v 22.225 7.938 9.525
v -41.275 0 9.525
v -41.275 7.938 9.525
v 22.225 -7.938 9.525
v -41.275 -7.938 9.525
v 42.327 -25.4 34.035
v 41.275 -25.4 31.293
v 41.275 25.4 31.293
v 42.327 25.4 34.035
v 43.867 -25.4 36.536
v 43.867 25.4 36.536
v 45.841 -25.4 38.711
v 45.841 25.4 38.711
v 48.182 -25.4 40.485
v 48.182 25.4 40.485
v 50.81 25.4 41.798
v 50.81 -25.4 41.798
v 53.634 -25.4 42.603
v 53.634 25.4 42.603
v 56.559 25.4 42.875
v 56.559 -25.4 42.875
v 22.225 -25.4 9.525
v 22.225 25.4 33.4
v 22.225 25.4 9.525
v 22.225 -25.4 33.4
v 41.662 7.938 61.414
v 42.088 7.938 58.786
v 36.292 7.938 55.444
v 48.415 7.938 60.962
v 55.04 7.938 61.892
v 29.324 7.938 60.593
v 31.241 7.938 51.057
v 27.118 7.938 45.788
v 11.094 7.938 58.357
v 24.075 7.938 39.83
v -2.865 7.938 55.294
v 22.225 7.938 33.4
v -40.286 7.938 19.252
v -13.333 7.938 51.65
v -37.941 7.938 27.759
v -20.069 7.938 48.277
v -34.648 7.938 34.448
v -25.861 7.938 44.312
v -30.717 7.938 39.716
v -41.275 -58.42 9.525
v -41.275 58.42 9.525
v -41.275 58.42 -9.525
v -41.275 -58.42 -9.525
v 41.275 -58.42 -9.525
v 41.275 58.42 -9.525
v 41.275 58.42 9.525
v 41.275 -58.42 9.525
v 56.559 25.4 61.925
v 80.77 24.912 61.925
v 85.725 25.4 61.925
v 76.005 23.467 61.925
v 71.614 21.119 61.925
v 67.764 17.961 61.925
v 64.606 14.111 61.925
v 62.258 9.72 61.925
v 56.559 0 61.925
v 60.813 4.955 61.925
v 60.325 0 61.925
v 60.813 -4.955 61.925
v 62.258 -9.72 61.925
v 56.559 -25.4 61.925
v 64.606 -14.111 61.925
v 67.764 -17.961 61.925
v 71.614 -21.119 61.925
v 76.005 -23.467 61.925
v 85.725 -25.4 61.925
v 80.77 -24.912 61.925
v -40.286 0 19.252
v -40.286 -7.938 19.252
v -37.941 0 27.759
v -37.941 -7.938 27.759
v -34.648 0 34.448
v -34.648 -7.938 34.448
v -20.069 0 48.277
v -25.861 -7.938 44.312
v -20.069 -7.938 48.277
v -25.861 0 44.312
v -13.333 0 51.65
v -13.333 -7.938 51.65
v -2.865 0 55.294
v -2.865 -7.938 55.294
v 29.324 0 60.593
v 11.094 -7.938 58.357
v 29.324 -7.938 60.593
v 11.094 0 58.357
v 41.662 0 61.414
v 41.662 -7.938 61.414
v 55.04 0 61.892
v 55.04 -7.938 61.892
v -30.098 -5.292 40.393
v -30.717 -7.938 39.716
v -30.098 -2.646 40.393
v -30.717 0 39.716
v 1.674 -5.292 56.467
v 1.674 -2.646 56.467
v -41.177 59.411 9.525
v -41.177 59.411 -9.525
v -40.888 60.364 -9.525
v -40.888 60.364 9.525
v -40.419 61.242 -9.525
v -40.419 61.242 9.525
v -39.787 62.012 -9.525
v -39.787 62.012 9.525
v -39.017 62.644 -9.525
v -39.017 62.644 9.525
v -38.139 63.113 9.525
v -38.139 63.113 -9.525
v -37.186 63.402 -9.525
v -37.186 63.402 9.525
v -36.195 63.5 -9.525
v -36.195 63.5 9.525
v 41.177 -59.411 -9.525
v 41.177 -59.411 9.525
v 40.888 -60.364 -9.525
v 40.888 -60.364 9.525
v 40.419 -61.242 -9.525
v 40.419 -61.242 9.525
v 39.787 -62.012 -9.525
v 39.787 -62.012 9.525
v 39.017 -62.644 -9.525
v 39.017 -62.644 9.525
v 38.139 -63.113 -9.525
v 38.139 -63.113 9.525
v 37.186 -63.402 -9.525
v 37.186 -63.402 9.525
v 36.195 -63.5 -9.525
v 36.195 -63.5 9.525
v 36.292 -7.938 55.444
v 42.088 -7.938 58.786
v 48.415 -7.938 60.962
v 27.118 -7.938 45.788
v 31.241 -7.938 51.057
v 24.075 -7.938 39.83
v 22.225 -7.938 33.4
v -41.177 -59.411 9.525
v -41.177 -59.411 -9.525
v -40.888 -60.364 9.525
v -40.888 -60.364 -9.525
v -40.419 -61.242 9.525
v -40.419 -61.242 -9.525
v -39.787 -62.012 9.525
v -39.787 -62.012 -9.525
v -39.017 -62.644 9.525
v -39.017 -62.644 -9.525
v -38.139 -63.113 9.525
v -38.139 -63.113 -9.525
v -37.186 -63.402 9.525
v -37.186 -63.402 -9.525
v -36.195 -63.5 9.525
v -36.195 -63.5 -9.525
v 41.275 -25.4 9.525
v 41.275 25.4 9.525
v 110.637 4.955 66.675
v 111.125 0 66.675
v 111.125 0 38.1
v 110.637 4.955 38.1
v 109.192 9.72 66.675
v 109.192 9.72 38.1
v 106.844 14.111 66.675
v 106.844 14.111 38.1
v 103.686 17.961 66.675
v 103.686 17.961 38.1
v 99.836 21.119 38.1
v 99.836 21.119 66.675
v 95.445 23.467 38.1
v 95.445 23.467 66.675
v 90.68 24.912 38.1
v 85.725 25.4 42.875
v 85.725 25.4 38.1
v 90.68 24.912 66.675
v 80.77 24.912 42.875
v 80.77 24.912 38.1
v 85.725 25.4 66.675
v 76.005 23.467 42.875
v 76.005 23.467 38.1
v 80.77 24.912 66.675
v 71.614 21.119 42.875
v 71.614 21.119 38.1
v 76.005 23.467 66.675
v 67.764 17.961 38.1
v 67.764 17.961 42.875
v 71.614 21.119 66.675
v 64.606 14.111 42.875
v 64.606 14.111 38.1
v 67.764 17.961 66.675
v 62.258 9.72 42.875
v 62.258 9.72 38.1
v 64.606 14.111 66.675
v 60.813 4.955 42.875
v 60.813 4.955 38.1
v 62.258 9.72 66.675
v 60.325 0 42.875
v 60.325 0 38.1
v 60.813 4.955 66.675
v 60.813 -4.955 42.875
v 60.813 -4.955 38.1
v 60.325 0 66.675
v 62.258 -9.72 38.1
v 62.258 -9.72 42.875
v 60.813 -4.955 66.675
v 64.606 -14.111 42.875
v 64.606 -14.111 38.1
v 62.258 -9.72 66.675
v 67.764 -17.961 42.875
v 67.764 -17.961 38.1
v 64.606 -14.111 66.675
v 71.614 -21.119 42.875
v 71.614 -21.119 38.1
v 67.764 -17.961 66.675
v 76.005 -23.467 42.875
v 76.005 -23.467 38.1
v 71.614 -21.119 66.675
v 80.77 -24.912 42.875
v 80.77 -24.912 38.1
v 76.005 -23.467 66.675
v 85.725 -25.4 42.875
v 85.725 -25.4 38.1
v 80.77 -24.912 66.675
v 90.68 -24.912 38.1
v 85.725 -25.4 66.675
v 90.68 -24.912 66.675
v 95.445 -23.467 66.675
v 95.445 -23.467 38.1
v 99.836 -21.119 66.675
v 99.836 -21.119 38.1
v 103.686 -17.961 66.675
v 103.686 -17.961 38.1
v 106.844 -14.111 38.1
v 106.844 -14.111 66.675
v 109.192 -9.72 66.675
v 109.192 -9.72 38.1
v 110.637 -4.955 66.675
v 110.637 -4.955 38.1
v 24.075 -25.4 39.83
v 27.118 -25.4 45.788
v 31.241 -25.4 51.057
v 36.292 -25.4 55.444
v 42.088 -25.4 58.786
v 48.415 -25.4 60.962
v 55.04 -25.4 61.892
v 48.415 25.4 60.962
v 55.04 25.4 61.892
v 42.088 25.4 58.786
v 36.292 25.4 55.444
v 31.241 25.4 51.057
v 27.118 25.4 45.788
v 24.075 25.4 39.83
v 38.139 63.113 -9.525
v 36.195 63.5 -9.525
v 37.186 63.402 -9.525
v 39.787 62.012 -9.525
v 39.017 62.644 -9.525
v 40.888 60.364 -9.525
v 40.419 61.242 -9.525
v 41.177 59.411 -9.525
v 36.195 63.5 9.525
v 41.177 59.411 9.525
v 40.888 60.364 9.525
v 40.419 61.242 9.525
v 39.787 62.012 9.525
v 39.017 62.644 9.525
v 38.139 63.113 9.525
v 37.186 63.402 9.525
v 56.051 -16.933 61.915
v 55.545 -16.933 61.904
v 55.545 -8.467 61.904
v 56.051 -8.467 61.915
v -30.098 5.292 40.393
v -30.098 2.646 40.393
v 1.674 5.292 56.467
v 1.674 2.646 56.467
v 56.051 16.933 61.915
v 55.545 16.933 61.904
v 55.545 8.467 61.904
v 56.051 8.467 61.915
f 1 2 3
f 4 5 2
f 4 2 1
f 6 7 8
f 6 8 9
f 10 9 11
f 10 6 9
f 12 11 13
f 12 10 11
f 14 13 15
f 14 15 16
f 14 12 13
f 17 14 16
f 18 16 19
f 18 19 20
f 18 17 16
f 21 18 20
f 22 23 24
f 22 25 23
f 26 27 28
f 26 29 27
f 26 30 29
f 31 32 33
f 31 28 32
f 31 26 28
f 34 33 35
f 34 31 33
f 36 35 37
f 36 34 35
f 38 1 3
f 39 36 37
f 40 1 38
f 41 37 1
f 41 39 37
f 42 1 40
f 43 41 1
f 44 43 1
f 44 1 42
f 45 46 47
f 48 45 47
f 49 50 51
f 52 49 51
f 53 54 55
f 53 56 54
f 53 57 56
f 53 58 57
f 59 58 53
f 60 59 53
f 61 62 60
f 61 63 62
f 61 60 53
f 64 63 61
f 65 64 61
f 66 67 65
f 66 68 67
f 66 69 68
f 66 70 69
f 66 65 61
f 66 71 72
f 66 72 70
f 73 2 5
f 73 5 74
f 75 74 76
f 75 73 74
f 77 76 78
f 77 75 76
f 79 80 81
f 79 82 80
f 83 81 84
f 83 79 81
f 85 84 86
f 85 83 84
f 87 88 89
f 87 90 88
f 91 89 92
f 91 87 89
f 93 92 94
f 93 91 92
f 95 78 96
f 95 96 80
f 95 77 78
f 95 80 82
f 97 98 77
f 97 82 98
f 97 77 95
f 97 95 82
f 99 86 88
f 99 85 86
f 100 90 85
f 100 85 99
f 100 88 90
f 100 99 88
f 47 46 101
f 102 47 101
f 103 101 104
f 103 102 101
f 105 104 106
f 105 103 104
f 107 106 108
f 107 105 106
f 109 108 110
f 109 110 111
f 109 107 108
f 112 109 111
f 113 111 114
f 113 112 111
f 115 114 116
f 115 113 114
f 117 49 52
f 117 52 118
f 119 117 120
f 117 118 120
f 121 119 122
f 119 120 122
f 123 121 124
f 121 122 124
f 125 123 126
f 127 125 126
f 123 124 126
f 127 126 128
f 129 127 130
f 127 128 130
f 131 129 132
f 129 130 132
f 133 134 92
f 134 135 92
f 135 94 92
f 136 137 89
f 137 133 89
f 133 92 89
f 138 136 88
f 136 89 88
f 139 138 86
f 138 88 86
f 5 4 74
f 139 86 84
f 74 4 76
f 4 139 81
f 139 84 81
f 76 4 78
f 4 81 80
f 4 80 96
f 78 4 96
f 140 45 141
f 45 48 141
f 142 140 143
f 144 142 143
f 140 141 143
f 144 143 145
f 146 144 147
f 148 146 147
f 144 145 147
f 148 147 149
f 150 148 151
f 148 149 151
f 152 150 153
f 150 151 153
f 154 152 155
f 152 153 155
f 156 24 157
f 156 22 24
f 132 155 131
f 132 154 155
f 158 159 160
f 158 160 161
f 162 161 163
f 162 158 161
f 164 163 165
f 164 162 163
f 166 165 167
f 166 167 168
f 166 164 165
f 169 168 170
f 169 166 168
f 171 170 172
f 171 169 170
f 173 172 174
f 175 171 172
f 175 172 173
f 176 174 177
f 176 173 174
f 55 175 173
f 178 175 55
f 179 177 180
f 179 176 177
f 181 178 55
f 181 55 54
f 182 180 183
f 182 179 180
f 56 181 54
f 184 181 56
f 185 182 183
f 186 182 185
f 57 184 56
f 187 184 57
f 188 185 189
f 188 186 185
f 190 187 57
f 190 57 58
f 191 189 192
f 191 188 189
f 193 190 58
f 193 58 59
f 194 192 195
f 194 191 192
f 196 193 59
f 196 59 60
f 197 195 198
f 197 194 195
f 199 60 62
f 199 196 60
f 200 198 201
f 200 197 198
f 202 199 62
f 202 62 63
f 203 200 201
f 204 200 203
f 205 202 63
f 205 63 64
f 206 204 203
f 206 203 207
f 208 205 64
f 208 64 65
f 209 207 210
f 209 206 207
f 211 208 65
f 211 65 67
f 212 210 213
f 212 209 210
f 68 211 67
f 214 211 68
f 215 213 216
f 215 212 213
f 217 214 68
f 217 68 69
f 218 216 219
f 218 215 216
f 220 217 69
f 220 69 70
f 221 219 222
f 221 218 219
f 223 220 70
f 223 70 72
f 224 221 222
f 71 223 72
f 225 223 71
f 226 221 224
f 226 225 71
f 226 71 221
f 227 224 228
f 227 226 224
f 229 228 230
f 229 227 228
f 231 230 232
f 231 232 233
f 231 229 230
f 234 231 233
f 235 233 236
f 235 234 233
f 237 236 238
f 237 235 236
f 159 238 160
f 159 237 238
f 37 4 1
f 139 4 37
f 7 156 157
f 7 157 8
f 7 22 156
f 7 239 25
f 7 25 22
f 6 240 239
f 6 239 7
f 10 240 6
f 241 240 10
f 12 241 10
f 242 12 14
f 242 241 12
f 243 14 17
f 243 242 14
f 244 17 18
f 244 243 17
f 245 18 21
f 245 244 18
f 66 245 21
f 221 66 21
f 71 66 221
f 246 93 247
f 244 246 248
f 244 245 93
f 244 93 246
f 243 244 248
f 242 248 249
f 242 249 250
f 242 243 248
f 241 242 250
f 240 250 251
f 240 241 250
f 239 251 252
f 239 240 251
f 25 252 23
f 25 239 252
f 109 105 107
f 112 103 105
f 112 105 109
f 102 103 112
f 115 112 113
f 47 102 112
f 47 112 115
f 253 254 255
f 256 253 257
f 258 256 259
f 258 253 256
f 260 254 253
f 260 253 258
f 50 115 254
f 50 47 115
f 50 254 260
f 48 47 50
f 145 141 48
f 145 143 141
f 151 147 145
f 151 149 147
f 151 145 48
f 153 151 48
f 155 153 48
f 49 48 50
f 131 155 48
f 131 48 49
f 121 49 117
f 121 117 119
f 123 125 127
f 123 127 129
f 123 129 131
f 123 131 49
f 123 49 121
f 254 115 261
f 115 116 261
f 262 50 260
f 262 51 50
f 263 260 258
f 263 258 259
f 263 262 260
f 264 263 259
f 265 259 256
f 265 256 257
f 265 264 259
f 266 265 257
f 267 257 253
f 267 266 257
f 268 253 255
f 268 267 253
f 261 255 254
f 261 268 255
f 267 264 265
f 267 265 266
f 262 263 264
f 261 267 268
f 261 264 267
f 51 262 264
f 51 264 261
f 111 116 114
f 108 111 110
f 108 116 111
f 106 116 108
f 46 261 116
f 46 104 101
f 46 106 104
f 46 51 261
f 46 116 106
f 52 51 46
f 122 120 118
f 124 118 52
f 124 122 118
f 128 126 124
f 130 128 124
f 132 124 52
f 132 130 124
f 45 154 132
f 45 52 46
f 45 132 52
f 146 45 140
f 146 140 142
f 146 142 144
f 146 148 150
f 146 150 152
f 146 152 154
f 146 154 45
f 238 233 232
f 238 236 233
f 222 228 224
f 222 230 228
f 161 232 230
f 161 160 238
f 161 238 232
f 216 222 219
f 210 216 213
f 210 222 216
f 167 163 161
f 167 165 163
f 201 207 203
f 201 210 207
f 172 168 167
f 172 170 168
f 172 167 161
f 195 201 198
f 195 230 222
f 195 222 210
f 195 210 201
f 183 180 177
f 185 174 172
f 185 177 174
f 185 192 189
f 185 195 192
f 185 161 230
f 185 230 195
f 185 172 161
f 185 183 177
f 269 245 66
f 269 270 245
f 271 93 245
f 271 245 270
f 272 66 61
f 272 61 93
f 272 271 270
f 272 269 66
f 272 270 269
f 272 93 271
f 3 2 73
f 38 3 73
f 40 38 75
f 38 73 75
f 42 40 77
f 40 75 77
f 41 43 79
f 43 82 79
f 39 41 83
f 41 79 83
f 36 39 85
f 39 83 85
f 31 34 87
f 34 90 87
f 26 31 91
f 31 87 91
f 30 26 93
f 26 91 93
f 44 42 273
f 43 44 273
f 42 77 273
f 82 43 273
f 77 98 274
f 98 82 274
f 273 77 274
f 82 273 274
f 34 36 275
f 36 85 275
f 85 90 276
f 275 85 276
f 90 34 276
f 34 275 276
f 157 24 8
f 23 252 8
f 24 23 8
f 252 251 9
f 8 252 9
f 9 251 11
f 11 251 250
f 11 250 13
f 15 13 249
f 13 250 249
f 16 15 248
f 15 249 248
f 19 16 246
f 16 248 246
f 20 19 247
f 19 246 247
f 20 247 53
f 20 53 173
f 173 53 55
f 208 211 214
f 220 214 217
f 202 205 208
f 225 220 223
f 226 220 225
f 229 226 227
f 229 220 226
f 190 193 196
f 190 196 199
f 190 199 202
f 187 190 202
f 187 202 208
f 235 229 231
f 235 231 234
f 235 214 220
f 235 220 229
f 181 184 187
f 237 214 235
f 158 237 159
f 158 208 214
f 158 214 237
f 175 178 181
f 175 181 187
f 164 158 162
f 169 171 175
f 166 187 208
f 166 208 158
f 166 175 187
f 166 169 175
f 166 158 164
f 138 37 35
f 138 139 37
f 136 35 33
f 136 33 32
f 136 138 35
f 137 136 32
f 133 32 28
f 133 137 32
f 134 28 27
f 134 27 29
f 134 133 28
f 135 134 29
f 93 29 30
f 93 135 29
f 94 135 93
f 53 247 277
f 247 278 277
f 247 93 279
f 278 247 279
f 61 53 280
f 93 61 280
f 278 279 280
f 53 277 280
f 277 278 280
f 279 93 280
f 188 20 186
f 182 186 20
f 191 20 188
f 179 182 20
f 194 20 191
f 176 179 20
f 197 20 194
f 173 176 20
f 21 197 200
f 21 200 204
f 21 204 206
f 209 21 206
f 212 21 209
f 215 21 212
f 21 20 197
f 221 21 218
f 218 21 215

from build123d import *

# Parameters (mm, degrees)
F1_DEPTH = 63.5
F0_W     = 25.4
F0_H     = 19.05
F2_DEPTH = 25.4
F3_DEPTH = 7.9375
F5_R     = 5.08


with BuildPart() as f1:
    # F0 (on Front) → F1 (new body, symmetric)
    with BuildSketch(Plane.XZ):
        Polygon((-41.275, 9.525), (-41.275, -9.525), (41.275, -9.525), (41.275, 9.525), (22.225, 9.525), align=None)
    extrude(amount=F1_DEPTH, both=True)

    # F5
    f5_edges = [f1.edges().sort_by_distance(p)[0] for p in [
        (-41.275, -63.5, 0),
        (41.275, -63.5, 0),
        (41.275, 63.5, 0),
        (-41.275, 63.5, 0),
    ]]
    fillet(f5_edges, radius=F5_R)


with BuildPart() as f2:
    # F0 (on Front) → F2 (new body, symmetric)
    with BuildSketch(Plane.XZ):
        with BuildLine():
            Line((22.225, 9.525), (41.275, 9.525))
            Line((41.275, 9.525), (41.275, 31.2928673412))
            ThreePointArc((41.275, 31.2928673412), (46.9703447865, 39.6525064902), (56.5586066456, 42.8752))
            Line((56.5586066456, 42.8752), (60.325, 42.8752))
            Line((60.325, 42.8752), (60.325, 61.9252))
            Line((60.325, 61.9252), (56.5586066456, 61.9252))
            add(Edge.make_bspline(
                [(55.0403231536, 61.8921824636), (55.5443471878, 61.9037807853), (56.0504409694, 61.9147836618), (56.5586066456, 61.9252)],
                knots=[110.1222919293, 110.1222919293, 110.1222919293, 110.1222919293, 110.9828615117, 110.9828615117, 110.9828615117, 110.9828615117], degree=3))
            ThreePointArc((55.0403231536, 61.8921824636), (33.6612531511, 53.3719050633), (22.225, 33.4001281016))
            Line((22.225, 33.4001281016), (22.225, 9.525))
        make_face()
        with Locations((73.025, 52.4002)):
            Rectangle(F0_W, F0_H)
    extrude(amount=F2_DEPTH, both=True)

    # F0 (on Front) → F4 (revolve)
    with BuildSketch(Plane.XZ):
        Polygon((85.725, 66.675), (85.725, 61.9252), (85.725, 42.8752), (85.725, 38.1), (111.125, 38.1), (111.125, 66.675), align=None)
    revolve(axis=Axis((85.725, 0, 52.3875), (0, 0, 1)))


with BuildPart() as f3:
    # F0 (on Front) → F3 (new body, symmetric)
    with BuildSketch(Plane.XZ):
        with BuildLine():
            add(Edge.make_bspline(
                [(-41.275, 9.525), (-40.0620750899, 49.1734854267), (-9.4568226537, 60.4080098956), (55.0403231536, 61.8921824636)],
                knots=[0, 0, 0, 0, 110.1222919293, 110.1222919293, 110.1222919293, 110.1222919293], degree=3))
            Line((-41.275, 9.525), (22.225, 9.525))
            Line((22.225, 9.525), (22.225, 33.4001281016))
            ThreePointArc((22.225, 33.4001281016), (33.6612531511, 53.3719050633), (55.0403231536, 61.8921824636))
        make_face()
    extrude(amount=F3_DEPTH, both=True)


solid = Compound([f1.part, f2.part, f3.part])
